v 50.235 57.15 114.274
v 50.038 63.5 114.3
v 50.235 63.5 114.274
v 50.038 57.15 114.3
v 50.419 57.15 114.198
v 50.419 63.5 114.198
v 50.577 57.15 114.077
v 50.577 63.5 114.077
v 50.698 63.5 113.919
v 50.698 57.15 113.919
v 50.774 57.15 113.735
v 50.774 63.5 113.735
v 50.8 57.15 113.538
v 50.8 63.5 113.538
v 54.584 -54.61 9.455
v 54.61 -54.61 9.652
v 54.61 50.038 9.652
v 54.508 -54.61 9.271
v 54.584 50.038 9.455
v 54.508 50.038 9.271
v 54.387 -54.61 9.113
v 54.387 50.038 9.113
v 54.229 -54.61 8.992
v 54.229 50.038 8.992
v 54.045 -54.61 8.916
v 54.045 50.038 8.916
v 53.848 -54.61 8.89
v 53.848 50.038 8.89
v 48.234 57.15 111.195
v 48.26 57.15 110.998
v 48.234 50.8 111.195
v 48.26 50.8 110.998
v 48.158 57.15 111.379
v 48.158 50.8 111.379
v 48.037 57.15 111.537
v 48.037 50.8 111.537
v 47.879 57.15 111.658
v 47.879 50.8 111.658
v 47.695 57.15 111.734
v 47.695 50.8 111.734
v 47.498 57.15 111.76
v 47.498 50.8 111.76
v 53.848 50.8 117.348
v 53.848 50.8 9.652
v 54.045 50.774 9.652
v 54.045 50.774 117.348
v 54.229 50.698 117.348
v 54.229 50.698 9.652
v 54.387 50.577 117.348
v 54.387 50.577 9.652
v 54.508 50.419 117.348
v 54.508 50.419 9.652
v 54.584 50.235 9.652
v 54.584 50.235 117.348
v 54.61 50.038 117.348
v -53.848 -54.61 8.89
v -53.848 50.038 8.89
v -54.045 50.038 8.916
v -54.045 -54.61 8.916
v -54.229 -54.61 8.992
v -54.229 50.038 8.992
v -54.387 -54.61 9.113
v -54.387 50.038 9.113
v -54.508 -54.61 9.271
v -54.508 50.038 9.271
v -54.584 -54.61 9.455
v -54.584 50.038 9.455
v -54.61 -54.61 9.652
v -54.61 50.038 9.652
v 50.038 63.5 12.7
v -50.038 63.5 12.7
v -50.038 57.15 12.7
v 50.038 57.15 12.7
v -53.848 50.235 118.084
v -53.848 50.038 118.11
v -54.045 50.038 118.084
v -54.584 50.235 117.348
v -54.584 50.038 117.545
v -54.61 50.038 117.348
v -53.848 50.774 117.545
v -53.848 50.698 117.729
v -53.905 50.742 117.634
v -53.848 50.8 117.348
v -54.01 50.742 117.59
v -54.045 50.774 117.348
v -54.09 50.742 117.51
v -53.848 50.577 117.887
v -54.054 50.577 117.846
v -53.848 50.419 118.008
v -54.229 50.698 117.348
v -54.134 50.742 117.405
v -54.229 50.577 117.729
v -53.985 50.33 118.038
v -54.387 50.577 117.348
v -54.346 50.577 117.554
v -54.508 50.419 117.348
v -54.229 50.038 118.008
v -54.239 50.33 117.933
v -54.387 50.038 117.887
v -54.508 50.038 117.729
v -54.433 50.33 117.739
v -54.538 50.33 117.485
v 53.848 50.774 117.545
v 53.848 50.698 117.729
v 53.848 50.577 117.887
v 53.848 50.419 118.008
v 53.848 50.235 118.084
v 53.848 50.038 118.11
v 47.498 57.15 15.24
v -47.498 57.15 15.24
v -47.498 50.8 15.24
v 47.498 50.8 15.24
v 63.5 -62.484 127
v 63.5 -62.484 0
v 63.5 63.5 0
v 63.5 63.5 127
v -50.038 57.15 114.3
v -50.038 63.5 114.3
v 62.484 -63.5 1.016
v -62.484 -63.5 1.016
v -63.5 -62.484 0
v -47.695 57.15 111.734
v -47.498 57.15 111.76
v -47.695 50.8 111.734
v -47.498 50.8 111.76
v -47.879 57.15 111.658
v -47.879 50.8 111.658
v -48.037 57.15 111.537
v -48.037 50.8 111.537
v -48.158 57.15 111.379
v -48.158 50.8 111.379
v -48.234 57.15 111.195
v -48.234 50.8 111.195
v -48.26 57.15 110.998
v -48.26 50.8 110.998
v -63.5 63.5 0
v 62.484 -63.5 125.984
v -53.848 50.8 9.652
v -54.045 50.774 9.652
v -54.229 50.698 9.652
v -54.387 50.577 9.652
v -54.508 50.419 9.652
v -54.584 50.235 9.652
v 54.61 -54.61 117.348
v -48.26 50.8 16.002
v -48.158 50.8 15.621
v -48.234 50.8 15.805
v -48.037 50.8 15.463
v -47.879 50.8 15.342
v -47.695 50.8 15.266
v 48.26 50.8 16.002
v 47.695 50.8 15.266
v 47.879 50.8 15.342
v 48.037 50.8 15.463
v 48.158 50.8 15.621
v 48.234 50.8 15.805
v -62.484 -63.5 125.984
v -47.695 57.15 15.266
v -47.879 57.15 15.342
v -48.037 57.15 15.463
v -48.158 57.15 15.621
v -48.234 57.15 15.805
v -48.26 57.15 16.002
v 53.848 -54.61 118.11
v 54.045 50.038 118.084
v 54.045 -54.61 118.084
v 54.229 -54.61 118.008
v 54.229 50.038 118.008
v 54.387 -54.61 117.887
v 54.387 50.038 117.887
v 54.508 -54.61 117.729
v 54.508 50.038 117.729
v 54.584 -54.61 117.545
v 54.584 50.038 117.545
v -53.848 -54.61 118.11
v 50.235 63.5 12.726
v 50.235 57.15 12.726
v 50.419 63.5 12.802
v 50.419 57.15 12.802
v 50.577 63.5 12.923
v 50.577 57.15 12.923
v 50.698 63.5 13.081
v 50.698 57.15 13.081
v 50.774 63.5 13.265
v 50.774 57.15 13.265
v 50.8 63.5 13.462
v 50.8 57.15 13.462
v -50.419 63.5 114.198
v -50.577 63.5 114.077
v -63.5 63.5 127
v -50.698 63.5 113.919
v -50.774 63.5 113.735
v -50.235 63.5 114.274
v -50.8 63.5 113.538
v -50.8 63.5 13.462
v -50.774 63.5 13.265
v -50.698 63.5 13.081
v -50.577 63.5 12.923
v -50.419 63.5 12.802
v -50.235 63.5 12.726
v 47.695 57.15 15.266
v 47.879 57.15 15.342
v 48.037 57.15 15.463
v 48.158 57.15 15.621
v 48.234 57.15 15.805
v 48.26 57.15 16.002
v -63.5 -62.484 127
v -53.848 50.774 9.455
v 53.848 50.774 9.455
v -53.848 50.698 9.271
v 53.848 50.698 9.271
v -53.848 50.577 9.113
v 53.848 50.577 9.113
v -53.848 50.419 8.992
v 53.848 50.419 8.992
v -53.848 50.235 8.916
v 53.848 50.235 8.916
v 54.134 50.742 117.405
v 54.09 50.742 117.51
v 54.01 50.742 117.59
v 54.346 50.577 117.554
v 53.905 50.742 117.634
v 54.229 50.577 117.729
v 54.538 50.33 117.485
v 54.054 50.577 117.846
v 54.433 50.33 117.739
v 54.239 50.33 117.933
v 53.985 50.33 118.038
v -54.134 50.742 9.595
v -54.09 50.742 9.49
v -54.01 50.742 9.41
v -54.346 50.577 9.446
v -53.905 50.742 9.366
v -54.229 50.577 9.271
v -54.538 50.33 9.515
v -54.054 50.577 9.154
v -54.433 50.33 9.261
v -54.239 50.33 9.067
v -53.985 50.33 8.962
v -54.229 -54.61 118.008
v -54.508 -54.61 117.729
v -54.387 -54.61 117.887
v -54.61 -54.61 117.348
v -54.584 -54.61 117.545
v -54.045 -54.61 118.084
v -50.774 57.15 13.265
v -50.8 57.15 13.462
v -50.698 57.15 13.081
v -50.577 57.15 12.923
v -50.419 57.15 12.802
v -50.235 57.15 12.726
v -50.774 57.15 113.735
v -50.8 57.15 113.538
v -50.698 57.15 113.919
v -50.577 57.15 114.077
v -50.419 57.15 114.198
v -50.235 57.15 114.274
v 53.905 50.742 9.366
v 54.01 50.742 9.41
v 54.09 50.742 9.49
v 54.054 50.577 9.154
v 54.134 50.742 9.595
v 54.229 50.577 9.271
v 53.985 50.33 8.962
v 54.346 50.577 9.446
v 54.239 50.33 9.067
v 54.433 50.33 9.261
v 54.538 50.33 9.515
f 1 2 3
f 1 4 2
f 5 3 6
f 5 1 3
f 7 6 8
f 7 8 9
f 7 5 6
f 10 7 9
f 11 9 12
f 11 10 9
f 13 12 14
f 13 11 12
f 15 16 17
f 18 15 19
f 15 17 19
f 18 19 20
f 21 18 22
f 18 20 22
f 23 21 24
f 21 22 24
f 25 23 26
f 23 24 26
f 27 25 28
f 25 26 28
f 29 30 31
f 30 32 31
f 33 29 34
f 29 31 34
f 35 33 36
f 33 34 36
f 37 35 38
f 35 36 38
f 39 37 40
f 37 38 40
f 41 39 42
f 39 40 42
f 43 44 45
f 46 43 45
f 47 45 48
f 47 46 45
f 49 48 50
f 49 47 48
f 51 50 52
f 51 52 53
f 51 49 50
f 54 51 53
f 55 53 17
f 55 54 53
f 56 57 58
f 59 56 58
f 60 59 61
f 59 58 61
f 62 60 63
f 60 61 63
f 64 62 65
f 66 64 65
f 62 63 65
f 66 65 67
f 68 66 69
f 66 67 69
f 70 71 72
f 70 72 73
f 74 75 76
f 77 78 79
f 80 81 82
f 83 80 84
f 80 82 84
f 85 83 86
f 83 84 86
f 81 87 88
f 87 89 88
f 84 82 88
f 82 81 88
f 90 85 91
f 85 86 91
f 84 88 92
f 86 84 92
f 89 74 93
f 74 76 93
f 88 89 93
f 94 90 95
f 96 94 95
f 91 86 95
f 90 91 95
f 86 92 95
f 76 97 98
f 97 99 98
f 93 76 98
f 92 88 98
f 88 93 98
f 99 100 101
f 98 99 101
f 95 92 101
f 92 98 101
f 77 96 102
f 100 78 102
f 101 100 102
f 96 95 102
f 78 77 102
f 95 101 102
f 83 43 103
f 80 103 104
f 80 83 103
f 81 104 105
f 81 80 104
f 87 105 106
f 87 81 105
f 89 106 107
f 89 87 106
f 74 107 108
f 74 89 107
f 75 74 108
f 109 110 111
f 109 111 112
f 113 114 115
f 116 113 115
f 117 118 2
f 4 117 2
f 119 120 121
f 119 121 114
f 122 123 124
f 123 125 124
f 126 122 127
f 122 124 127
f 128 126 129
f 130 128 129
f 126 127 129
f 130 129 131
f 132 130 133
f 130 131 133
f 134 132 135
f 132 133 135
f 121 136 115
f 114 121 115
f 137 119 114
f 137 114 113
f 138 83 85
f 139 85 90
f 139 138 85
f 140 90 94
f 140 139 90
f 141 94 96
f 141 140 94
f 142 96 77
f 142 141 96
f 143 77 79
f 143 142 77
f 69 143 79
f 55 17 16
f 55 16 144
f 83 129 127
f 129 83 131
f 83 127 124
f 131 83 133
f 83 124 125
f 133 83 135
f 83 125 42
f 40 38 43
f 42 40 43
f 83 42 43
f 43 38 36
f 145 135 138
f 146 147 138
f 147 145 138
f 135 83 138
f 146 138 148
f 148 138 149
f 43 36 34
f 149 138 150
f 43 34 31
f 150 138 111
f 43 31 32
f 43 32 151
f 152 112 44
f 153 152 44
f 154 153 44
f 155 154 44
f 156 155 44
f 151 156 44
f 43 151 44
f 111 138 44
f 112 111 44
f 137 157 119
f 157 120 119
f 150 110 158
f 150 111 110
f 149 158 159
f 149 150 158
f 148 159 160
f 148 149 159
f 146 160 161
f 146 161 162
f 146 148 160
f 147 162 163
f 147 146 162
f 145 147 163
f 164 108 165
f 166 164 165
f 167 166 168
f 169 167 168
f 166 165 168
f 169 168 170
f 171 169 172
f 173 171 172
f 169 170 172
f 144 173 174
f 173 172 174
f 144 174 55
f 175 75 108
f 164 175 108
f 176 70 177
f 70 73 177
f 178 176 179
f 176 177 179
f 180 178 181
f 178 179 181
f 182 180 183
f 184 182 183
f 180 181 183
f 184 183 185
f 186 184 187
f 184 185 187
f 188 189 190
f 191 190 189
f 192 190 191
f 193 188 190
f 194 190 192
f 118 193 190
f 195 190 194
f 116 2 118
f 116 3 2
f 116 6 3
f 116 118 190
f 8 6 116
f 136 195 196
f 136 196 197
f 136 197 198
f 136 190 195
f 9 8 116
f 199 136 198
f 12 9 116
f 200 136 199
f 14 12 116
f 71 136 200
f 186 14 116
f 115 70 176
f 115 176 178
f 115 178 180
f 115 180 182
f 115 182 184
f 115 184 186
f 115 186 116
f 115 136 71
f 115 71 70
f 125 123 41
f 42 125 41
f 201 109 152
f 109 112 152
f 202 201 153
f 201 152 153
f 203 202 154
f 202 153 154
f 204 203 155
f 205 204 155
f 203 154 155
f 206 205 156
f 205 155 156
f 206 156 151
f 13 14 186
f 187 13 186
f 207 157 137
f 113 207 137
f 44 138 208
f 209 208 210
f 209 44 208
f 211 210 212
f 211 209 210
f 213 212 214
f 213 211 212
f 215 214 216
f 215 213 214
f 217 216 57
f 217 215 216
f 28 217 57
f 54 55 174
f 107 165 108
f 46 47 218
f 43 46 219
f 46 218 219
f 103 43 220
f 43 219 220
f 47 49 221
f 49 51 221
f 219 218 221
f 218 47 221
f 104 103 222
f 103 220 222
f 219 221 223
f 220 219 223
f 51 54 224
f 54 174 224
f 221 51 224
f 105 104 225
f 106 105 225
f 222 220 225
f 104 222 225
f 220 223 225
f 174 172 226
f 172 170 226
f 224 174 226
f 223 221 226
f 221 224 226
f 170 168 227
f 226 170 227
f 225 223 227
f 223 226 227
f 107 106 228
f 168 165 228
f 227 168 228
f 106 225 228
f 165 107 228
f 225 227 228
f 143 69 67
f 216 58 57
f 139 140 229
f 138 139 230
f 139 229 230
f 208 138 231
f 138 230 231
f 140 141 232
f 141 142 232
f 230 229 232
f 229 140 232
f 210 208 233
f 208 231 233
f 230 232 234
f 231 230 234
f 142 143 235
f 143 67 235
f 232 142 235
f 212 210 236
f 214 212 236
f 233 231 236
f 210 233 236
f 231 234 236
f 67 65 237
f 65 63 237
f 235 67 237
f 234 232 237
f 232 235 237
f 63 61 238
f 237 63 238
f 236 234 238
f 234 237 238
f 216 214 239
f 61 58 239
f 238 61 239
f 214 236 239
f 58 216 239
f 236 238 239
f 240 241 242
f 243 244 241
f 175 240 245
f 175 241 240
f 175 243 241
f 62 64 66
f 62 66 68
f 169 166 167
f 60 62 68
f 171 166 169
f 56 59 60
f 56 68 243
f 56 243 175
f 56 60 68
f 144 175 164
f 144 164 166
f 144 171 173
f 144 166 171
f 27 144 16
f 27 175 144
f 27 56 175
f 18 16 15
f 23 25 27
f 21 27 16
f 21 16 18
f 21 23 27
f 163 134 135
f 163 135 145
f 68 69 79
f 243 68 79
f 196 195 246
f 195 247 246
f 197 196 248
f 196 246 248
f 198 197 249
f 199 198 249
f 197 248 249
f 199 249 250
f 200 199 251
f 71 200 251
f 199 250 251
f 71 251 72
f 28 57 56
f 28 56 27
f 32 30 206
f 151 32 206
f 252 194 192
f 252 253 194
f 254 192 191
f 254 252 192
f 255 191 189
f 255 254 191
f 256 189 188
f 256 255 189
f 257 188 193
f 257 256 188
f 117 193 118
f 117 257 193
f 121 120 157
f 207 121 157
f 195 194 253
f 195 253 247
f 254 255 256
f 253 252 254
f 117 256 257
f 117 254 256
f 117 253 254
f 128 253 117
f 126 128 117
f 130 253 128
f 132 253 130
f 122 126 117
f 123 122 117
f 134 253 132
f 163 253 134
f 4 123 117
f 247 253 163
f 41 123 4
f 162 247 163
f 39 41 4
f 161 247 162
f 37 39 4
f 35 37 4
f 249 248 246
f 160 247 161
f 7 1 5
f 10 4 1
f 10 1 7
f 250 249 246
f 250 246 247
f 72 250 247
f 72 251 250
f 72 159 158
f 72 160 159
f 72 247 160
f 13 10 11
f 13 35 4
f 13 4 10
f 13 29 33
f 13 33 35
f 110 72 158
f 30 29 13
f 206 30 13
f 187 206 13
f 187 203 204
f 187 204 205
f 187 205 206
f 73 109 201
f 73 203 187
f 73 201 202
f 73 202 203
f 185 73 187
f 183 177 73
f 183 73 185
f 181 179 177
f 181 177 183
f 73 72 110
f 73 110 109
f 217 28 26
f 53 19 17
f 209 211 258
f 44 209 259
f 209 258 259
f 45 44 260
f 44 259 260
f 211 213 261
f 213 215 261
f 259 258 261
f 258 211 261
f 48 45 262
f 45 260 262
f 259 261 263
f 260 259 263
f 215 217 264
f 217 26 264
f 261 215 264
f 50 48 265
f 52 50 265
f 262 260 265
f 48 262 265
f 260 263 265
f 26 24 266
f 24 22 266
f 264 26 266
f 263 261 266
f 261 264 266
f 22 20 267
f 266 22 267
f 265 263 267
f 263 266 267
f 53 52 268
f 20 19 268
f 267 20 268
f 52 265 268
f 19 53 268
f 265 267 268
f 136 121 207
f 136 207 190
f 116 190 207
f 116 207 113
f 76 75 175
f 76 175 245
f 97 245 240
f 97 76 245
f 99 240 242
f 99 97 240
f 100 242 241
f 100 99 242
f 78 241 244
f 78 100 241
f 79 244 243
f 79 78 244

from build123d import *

# Parameters (mm, degrees)
SKETCH1_W           = 127
SKETCH1_H           = 127
BOSS_EXTRUDE1_DEPTH = 127
SKETCH2_W           = 96.52
SKETCH2_H           = 96.52
CUT_EXTRUDE1_DEPTH  = 118.11
SKETCH3_W           = 101.6
SKETCH3_H           = 101.6
SKETCH3_W_2         = 96.52
SKETCH3_H_2         = 96.52
CUT_EXTRUDE2_DEPTH  = 6.35
SKETCH5_W           = 96.52
SKETCH5_H           = 105.41
CUT_EXTRUDE3_DEPTH  = 6.35
SKETCH6_W           = 109.22
SKETCH6_H           = 105.41
CUT_EXTRUDE4_DEPTH  = 6.35
CHAMFER1_SIZE       = 1.016
FILLET2_R           = 0.762
FILLET3_R           = 0.762
FILLET4_R           = 0.762


with BuildPart() as part:
    # Sketch1 → Boss-Extrude1 (new body)
    with BuildSketch(Plane.XY):
        Rectangle(SKETCH1_W, SKETCH1_H)
    extrude(amount=BOSS_EXTRUDE1_DEPTH)

    # Sketch2 → Cut-Extrude1 (cut)
    with BuildSketch(Plane(origin=(0, 63.5, 0), x_dir=(1, 0, 0), z_dir=(0, 1, 0))):
        with Locations((0, -63.5)):
            Rectangle(SKETCH2_W, SKETCH2_H)
    extrude(amount=-CUT_EXTRUDE1_DEPTH, mode=Mode.SUBTRACT)

    # Sketch3 → Cut-Extrude2 (cut)
    with BuildSketch(Plane(origin=(0, 63.5, 0), x_dir=(1, 0, 0), z_dir=(0, 1, 0))):
        with Locations((0, -63.5)):
            Rectangle(SKETCH3_W, SKETCH3_H)
        with Locations((0, -63.5)):
            Rectangle(SKETCH3_W_2, SKETCH3_H_2, mode=Mode.SUBTRACT)
    extrude(amount=-CUT_EXTRUDE2_DEPTH, mode=Mode.SUBTRACT)

    # Sketch5 → Cut-Extrude3 (cut)
    with BuildSketch(Plane.XY.offset(15.24)):
        with Locations((0, -1.905)):
            Rectangle(SKETCH5_W, SKETCH5_H)
    cut_extrude3 = extrude(amount=-CUT_EXTRUDE3_DEPTH, mode=Mode.SUBTRACT)

    # Mirror1: Cut-Extrude3 across plane
    add(cut_extrude3.mirror(Plane(origin=(0, 0, 63.5), x_dir=(1, 0, 0), z_dir=(0, 0, -1))), mode=Mode.SUBTRACT)

    # Sketch6 → Cut-Extrude4 (cut)
    with BuildSketch(Plane.ZY.offset(-48.26)):
        with Locations((63.5, -1.905)):
            Rectangle(SKETCH6_W, SKETCH6_H)
    cut_extrude4 = extrude(amount=-CUT_EXTRUDE4_DEPTH, mode=Mode.SUBTRACT)

    # Mirror2: Cut-Extrude4 across plane
    add(cut_extrude4.mirror(Plane(origin=(0, 0, 0), x_dir=(0, 0, 1), z_dir=(1, 0, 0))), mode=Mode.SUBTRACT)

    # Chamfer1
    chamfer1_edges = [part.edges().sort_by_distance(p)[0] for p in [
        (0, -63.5, 127),
        (0, -63.5, 0),
        (63.5, -63.5, 63.5),
        (-63.5, -63.5, 63.5),
    ]]
    chamfer(chamfer1_edges, length=CHAMFER1_SIZE)

    # Fillet2
    fillet2_edges = [part.edges().sort_by_distance(p)[0] for p in [
        (54.61, -1.905, 8.89),
        (54.61, -1.905, 118.11),
        (-54.61, -1.905, 8.89),
        (-54.61, -1.905, 118.11),
    ]]
    fillet(fillet2_edges, radius=FILLET2_R)

    # Fillet3
    fillet3_edges = [part.edges().sort_by_distance(p)[0] for p in [
        (-50.8, 60.325, 114.3),
        (-50.8, 60.325, 12.7),
        (50.8, 60.325, 12.7),
        (50.8, 60.325, 114.3),
        (-48.26, 53.975, 15.24),
        (48.26, 53.975, 15.24),
        (48.26, 53.975, 111.76),
        (-48.26, 53.975, 111.76),
    ]]
    fillet(fillet3_edges, radius=FILLET3_R)

    # Fillet4
    fillet4_edges = [part.edges().sort_by_distance(p)[0] for p in [
        (54.61, 50.8, 63.5),
        (-54.61, 50.8, 63.5),
        (0, 50.8, 8.89),
        (0, 50.8, 118.11),
        (-54.386815367, 50.8, 9.113184633),
        (54.386815367, 50.8, 9.113184633),
        (-54.386815367, 50.8, 117.886815367),
        (54.386815367, 50.8, 117.886815367),
    ]]
    fillet(fillet4_edges, radius=FILLET4_R)


solid = part.part
